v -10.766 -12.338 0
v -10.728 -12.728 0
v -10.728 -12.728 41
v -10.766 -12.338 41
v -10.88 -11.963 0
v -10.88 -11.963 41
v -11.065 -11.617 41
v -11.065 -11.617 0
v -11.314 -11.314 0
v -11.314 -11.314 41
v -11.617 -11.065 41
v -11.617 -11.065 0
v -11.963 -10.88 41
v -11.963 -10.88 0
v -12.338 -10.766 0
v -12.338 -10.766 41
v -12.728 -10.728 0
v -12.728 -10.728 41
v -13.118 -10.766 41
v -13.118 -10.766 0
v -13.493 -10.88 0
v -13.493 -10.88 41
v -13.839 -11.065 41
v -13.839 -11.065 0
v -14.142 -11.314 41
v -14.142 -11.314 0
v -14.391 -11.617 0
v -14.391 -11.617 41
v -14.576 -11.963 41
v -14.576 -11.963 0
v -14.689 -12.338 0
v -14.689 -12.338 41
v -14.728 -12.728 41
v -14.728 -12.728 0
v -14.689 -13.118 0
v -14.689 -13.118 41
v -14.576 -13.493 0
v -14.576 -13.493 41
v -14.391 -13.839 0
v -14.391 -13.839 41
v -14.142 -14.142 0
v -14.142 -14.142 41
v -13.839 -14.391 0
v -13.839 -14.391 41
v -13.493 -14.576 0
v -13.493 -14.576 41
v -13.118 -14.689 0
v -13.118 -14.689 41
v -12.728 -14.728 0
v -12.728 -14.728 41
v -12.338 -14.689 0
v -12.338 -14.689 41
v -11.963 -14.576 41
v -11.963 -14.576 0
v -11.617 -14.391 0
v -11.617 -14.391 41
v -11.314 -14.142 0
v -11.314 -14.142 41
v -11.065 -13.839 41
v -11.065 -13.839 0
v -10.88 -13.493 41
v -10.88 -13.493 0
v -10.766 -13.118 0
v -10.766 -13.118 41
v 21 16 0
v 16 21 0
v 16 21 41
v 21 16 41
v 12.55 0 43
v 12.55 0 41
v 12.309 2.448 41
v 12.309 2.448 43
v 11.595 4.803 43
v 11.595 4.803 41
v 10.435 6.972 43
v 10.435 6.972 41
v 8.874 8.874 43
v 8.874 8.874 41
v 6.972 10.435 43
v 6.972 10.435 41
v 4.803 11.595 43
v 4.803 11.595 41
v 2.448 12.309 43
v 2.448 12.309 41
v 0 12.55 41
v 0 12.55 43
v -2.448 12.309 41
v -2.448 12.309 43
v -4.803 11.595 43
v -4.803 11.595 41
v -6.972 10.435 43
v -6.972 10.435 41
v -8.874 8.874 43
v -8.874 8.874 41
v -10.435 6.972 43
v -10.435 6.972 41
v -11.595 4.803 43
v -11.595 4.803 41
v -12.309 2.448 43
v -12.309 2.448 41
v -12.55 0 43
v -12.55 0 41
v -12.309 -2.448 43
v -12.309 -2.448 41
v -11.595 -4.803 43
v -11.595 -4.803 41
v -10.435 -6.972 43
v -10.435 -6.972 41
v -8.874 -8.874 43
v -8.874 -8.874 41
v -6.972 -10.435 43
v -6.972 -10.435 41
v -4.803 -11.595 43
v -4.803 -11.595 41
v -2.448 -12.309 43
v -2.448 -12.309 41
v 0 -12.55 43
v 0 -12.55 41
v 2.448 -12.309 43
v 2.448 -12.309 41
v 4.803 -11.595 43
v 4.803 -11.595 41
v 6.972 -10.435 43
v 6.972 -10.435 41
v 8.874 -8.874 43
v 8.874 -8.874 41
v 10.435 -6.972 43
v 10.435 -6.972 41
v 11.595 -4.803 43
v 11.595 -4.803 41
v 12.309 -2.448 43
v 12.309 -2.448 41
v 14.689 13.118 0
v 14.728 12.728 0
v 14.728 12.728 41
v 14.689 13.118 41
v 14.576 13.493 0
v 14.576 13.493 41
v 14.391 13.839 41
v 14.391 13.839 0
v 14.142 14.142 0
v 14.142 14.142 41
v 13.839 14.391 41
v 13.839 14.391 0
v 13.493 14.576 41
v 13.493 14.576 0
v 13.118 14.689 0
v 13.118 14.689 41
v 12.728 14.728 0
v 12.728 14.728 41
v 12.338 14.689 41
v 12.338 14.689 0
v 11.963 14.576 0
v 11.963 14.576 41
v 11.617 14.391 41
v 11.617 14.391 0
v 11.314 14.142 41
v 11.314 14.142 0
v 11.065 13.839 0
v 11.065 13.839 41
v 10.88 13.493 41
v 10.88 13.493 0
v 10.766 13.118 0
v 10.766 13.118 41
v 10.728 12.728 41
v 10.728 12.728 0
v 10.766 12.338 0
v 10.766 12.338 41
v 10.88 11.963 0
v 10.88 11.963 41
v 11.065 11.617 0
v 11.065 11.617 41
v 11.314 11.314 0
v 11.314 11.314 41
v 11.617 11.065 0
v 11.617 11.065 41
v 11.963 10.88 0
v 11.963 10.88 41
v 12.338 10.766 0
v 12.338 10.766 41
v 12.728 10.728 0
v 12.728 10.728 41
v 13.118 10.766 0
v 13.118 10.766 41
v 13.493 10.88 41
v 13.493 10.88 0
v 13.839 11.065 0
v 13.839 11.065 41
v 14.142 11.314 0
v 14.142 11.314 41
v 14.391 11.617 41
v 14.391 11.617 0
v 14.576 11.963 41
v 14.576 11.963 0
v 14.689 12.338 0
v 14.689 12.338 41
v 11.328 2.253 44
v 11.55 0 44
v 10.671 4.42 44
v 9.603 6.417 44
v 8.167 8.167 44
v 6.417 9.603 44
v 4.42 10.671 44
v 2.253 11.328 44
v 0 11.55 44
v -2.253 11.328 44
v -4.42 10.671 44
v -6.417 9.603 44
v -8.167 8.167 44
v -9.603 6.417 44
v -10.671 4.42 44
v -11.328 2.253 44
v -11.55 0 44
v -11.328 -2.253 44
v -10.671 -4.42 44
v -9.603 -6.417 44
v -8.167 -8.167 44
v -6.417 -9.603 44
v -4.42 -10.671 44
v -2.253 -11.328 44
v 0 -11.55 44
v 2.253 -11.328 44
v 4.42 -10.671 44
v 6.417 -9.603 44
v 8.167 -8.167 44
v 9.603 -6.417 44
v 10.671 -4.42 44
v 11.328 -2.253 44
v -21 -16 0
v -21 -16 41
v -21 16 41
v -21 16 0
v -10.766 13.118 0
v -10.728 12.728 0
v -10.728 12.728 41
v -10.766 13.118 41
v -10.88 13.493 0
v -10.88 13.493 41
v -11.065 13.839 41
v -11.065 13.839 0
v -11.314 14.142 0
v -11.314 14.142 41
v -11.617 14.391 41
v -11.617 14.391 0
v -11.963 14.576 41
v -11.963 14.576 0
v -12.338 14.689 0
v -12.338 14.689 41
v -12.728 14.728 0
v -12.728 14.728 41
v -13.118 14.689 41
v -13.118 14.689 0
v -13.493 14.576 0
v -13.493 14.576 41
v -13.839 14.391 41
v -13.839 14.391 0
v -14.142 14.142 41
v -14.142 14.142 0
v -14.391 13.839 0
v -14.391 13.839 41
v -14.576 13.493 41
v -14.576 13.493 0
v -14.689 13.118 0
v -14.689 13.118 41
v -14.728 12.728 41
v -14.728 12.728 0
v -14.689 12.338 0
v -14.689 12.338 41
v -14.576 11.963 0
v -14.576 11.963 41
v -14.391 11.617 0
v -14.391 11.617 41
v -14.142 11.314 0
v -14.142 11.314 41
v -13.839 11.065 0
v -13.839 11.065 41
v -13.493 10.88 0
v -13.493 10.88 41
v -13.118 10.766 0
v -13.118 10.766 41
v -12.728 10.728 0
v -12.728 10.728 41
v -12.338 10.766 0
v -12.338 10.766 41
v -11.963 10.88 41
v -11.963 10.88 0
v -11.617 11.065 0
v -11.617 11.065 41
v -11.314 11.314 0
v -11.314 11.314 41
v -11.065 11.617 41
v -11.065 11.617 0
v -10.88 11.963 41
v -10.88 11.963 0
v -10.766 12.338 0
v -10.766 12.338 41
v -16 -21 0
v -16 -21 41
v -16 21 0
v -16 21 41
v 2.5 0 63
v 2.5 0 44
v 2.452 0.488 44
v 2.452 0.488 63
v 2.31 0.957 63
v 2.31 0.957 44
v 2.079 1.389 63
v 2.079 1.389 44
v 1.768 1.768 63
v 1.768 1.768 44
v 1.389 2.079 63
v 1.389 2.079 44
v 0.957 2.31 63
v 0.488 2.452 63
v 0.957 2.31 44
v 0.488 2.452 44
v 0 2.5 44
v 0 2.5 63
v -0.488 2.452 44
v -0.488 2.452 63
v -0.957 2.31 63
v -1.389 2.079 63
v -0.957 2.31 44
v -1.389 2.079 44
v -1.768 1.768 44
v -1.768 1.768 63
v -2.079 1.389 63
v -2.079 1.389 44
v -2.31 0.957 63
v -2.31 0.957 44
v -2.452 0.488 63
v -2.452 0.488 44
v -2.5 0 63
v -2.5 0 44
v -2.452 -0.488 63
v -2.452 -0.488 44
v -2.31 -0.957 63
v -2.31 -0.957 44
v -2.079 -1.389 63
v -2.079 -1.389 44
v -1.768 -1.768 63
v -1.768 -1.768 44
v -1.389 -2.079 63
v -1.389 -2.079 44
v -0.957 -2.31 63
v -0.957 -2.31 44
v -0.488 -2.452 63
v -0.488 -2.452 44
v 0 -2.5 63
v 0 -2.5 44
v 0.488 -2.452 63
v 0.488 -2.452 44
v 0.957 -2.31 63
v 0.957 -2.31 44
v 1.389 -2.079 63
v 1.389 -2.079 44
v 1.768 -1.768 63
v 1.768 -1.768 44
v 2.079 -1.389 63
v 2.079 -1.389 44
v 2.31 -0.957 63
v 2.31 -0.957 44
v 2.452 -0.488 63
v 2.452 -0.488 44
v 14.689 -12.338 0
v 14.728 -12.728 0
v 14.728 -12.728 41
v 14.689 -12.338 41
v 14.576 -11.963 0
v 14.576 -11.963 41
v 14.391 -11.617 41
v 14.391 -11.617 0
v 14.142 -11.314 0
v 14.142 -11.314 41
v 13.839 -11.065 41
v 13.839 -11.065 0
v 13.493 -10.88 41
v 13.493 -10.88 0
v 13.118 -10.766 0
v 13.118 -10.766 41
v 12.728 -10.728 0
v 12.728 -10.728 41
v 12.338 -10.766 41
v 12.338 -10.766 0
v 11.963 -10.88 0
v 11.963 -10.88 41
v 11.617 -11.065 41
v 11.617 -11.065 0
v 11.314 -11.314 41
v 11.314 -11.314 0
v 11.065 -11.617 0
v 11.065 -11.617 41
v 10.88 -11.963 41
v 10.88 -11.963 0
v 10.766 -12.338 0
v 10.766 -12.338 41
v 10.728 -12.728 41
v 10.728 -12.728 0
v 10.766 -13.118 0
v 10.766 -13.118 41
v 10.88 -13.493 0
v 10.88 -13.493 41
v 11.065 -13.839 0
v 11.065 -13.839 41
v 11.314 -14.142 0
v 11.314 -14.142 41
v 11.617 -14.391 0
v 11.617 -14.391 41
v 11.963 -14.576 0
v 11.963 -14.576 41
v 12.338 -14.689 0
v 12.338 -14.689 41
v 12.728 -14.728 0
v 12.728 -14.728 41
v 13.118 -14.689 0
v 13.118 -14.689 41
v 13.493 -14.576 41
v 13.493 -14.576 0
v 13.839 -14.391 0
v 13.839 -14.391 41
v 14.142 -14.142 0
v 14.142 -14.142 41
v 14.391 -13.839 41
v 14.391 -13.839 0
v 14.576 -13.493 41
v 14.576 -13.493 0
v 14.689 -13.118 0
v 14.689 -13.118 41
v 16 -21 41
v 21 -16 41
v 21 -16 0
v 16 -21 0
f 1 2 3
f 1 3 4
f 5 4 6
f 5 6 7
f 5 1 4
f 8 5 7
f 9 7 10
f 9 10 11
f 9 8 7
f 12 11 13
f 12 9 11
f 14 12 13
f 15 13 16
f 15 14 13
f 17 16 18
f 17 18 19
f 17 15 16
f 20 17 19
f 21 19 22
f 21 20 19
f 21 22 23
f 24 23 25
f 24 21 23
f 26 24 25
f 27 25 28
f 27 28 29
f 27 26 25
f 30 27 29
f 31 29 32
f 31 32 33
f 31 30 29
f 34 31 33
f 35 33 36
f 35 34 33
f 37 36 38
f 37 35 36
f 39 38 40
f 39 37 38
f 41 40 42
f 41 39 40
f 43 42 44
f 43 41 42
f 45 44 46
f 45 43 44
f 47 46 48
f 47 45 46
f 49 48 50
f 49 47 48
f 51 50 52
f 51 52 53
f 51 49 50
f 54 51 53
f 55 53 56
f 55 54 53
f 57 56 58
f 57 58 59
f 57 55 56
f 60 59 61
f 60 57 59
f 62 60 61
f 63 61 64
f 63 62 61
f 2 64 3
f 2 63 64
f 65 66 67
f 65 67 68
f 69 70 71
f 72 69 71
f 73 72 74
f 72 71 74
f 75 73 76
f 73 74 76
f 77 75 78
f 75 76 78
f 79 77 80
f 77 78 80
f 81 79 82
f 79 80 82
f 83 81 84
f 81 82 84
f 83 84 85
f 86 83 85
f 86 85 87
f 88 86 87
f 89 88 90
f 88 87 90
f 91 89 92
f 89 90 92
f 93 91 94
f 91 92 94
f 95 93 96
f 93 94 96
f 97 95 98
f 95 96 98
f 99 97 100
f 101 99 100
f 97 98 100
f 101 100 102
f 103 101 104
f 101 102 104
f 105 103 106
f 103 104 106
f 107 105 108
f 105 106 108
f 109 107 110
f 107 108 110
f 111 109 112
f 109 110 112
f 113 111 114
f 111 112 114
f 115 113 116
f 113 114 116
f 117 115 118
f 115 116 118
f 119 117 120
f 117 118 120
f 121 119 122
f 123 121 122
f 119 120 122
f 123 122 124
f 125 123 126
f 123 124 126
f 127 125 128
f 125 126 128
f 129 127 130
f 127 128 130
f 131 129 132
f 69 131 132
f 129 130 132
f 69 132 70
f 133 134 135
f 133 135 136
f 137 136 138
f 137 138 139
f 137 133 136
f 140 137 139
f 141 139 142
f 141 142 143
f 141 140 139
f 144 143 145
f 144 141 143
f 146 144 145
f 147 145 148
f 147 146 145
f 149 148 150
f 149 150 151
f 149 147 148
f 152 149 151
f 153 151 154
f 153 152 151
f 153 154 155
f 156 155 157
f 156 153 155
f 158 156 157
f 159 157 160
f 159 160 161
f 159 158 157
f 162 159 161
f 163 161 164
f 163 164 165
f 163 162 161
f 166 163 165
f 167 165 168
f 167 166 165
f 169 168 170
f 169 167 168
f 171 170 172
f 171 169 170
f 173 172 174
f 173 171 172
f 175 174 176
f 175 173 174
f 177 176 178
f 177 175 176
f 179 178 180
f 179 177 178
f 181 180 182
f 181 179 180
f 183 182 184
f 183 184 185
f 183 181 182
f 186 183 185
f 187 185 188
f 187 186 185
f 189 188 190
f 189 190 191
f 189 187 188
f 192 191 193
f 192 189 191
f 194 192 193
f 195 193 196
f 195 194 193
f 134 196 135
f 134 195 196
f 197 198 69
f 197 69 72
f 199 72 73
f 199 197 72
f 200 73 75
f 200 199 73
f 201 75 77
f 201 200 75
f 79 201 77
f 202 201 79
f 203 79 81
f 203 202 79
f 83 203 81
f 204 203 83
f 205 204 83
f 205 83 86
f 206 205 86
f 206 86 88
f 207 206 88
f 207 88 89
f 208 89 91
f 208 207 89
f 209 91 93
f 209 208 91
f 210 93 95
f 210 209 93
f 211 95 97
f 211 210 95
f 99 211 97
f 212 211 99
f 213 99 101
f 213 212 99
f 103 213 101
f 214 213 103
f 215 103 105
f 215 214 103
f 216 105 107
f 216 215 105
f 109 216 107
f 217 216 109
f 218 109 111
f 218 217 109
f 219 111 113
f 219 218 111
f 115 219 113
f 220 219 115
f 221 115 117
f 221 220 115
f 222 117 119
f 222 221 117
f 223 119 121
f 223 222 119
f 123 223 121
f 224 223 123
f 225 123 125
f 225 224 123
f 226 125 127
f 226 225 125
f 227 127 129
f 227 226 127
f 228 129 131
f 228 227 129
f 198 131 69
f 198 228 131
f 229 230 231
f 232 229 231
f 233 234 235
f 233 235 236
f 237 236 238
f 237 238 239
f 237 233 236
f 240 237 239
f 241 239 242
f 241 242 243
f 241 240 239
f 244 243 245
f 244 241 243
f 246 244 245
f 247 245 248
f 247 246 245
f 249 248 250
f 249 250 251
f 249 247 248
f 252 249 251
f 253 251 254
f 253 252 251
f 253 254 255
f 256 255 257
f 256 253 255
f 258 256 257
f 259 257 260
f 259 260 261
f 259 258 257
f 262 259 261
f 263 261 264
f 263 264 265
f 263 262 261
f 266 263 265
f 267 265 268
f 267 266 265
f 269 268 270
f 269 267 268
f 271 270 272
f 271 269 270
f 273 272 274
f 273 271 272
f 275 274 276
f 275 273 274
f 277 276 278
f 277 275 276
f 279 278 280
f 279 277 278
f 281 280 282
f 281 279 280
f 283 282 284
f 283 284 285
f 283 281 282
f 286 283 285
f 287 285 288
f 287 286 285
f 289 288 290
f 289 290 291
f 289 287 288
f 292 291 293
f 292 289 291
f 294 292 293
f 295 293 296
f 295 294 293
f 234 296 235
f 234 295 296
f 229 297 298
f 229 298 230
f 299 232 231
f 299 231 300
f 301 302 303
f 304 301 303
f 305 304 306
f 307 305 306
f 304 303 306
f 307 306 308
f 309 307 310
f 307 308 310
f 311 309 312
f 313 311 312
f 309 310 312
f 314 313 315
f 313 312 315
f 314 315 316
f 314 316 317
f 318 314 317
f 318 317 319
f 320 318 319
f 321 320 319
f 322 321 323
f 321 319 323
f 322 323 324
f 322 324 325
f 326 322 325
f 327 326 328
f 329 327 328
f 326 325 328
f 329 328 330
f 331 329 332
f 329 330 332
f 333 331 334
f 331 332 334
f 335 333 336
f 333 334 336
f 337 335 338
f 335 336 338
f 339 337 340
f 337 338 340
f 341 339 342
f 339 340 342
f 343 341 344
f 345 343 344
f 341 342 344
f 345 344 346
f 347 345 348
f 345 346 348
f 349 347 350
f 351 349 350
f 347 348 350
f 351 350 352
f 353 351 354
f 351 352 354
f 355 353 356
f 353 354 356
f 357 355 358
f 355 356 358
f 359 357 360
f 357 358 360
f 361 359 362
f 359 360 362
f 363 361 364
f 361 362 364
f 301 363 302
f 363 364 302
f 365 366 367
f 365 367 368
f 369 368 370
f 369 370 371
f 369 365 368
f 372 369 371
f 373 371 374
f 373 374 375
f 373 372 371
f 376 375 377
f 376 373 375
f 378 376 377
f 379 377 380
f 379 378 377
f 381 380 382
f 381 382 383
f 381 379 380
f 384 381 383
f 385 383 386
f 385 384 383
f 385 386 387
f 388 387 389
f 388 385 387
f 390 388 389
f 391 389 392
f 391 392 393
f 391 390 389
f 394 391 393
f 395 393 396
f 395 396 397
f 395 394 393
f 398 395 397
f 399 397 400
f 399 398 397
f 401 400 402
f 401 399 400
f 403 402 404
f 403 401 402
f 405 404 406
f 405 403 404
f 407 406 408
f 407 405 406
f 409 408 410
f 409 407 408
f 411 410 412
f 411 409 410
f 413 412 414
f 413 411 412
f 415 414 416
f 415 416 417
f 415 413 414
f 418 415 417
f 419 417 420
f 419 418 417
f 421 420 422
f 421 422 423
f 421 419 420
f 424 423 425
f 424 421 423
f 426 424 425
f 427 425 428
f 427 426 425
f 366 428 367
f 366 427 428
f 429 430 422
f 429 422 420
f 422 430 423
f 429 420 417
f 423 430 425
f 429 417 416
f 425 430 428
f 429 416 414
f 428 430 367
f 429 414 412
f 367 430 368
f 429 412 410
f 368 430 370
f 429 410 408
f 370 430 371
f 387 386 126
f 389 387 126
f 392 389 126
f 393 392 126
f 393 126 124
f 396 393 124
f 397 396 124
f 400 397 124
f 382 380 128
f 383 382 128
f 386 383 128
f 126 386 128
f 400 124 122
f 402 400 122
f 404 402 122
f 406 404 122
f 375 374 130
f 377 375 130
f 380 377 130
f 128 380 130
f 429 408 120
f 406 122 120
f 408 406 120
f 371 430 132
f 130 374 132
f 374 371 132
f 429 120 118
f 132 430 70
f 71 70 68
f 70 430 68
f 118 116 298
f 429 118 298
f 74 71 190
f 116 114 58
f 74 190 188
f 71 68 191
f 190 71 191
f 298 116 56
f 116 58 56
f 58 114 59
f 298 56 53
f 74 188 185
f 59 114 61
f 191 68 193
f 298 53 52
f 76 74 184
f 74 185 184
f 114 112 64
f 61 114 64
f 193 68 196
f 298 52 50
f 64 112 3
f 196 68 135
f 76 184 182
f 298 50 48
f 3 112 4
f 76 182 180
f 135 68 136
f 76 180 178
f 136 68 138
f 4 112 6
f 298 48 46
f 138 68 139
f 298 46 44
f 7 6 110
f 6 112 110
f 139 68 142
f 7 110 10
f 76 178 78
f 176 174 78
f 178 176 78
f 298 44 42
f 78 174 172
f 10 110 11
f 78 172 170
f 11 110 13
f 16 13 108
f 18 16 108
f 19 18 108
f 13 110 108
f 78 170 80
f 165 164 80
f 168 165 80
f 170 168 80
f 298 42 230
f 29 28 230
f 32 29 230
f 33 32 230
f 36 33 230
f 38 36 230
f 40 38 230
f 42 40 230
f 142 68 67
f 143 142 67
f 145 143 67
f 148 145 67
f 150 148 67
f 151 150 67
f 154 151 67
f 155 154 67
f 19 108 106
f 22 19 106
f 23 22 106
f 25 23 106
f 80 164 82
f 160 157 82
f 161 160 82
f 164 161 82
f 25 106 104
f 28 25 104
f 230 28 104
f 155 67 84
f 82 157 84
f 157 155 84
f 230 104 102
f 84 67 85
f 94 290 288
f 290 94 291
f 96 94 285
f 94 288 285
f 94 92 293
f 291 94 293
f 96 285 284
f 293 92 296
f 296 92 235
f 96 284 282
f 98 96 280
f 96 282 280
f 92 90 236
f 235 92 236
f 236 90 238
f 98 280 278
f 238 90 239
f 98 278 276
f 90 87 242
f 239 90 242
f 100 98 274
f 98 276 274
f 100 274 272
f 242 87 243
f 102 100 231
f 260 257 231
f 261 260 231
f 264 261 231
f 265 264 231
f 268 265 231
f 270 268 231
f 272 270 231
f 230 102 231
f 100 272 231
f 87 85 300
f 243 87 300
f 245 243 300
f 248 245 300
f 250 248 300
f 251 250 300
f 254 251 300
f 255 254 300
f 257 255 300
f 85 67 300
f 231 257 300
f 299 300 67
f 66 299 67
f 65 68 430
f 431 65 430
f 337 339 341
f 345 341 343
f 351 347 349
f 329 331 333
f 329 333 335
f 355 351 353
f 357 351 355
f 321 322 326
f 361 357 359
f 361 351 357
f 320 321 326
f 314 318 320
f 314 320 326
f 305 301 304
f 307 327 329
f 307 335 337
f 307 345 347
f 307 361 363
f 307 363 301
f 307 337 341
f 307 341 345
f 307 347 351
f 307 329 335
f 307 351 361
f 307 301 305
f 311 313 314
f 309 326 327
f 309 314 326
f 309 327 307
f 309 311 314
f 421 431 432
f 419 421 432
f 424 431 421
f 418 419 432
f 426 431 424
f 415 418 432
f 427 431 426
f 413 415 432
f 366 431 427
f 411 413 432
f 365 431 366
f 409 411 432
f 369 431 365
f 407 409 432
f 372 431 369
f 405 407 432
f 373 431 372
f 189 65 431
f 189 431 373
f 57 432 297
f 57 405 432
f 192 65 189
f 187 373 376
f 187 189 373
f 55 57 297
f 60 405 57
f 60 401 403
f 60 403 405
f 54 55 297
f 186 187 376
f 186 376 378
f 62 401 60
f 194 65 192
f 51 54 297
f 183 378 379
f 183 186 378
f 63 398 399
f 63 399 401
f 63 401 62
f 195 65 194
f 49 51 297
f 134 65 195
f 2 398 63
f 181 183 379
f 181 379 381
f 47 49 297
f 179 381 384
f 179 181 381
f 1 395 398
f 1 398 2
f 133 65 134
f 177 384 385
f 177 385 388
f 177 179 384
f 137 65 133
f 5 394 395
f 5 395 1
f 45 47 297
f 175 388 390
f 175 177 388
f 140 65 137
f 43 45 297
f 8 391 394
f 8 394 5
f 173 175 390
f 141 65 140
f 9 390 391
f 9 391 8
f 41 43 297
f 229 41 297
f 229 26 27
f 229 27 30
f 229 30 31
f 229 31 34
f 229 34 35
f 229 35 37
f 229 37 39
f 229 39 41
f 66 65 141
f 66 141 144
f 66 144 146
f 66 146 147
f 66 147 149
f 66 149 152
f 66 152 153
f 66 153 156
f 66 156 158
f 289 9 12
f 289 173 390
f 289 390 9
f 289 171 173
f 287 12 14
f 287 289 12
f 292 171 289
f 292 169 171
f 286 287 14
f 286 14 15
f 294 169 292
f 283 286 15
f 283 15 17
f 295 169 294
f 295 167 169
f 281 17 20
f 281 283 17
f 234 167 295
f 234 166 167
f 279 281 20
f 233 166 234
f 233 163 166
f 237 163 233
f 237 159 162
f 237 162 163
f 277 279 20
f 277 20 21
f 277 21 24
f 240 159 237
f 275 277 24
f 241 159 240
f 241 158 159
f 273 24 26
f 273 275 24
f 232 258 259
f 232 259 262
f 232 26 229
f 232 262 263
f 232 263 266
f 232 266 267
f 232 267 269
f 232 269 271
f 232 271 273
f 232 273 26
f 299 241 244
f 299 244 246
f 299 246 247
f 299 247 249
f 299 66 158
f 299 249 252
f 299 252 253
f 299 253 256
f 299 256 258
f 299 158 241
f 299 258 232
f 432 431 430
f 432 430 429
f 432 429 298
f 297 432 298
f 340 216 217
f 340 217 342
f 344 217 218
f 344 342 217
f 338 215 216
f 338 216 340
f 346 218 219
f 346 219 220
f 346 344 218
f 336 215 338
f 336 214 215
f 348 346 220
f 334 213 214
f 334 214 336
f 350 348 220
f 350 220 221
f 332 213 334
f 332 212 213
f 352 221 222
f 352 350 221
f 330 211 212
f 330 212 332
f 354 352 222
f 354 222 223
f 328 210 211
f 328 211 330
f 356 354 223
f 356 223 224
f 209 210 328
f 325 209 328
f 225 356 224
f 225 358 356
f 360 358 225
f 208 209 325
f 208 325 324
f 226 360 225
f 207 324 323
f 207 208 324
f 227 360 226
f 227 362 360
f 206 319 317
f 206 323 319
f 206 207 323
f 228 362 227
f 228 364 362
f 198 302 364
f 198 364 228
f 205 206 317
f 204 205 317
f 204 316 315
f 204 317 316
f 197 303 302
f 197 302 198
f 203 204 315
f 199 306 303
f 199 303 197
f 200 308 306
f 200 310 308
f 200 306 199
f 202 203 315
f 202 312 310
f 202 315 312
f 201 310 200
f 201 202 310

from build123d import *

# Parameters (mm, degrees)
CROQUIS1_R              = 2
SALIENTE_EXTRUIR1_DEPTH = 41
CROQUIS2_R              = 12.55
SALIENTE_EXTRUIR2_DEPTH = 3
CROQUIS3_R              = 2.5
SALIENTE_EXTRUIR3_DEPTH = 19
CHAFL_N1_SIZE           = 1


with BuildPart() as part:
    # Croquis1 → Saliente-Extruir1 (new body)
    with BuildSketch(Plane.XY):
        Polygon((-21, 16), (-16, 21), (16, 21), (21, 16), (21, -16), (16, -21), (-16, -21), (-21, -16), align=None)
        with Locations((12.727922061, 12.727922061)):
            Circle(CROQUIS1_R, mode=Mode.SUBTRACT)
        with Locations((12.727922061, -12.727922061)):
            Circle(CROQUIS1_R, mode=Mode.SUBTRACT)
        with Locations((-12.727922061, -12.727922061)):
            Circle(CROQUIS1_R, mode=Mode.SUBTRACT)
        with Locations((-12.727922061, 12.727922061)):
            Circle(CROQUIS1_R, mode=Mode.SUBTRACT)
    extrude(amount=SALIENTE_EXTRUIR1_DEPTH)

    # Croquis2 → Saliente-Extruir2 (add)
    with BuildSketch(Plane.XY.offset(41)):
        Circle(CROQUIS2_R)
    extrude(amount=SALIENTE_EXTRUIR2_DEPTH)

    # Croquis3 → Saliente-Extruir3 (add)
    with BuildSketch(Plane.XY.offset(44)):
        Circle(CROQUIS3_R)
    extrude(amount=SALIENTE_EXTRUIR3_DEPTH)

    # Chaflán1
    chafl_n1_edges = [part.edges().sort_by_distance(p)[0] for p in [
        (-12.55, 0, 44),
    ]]
    chamfer(chafl_n1_edges, length=CHAFL_N1_SIZE)


solid = part.part
